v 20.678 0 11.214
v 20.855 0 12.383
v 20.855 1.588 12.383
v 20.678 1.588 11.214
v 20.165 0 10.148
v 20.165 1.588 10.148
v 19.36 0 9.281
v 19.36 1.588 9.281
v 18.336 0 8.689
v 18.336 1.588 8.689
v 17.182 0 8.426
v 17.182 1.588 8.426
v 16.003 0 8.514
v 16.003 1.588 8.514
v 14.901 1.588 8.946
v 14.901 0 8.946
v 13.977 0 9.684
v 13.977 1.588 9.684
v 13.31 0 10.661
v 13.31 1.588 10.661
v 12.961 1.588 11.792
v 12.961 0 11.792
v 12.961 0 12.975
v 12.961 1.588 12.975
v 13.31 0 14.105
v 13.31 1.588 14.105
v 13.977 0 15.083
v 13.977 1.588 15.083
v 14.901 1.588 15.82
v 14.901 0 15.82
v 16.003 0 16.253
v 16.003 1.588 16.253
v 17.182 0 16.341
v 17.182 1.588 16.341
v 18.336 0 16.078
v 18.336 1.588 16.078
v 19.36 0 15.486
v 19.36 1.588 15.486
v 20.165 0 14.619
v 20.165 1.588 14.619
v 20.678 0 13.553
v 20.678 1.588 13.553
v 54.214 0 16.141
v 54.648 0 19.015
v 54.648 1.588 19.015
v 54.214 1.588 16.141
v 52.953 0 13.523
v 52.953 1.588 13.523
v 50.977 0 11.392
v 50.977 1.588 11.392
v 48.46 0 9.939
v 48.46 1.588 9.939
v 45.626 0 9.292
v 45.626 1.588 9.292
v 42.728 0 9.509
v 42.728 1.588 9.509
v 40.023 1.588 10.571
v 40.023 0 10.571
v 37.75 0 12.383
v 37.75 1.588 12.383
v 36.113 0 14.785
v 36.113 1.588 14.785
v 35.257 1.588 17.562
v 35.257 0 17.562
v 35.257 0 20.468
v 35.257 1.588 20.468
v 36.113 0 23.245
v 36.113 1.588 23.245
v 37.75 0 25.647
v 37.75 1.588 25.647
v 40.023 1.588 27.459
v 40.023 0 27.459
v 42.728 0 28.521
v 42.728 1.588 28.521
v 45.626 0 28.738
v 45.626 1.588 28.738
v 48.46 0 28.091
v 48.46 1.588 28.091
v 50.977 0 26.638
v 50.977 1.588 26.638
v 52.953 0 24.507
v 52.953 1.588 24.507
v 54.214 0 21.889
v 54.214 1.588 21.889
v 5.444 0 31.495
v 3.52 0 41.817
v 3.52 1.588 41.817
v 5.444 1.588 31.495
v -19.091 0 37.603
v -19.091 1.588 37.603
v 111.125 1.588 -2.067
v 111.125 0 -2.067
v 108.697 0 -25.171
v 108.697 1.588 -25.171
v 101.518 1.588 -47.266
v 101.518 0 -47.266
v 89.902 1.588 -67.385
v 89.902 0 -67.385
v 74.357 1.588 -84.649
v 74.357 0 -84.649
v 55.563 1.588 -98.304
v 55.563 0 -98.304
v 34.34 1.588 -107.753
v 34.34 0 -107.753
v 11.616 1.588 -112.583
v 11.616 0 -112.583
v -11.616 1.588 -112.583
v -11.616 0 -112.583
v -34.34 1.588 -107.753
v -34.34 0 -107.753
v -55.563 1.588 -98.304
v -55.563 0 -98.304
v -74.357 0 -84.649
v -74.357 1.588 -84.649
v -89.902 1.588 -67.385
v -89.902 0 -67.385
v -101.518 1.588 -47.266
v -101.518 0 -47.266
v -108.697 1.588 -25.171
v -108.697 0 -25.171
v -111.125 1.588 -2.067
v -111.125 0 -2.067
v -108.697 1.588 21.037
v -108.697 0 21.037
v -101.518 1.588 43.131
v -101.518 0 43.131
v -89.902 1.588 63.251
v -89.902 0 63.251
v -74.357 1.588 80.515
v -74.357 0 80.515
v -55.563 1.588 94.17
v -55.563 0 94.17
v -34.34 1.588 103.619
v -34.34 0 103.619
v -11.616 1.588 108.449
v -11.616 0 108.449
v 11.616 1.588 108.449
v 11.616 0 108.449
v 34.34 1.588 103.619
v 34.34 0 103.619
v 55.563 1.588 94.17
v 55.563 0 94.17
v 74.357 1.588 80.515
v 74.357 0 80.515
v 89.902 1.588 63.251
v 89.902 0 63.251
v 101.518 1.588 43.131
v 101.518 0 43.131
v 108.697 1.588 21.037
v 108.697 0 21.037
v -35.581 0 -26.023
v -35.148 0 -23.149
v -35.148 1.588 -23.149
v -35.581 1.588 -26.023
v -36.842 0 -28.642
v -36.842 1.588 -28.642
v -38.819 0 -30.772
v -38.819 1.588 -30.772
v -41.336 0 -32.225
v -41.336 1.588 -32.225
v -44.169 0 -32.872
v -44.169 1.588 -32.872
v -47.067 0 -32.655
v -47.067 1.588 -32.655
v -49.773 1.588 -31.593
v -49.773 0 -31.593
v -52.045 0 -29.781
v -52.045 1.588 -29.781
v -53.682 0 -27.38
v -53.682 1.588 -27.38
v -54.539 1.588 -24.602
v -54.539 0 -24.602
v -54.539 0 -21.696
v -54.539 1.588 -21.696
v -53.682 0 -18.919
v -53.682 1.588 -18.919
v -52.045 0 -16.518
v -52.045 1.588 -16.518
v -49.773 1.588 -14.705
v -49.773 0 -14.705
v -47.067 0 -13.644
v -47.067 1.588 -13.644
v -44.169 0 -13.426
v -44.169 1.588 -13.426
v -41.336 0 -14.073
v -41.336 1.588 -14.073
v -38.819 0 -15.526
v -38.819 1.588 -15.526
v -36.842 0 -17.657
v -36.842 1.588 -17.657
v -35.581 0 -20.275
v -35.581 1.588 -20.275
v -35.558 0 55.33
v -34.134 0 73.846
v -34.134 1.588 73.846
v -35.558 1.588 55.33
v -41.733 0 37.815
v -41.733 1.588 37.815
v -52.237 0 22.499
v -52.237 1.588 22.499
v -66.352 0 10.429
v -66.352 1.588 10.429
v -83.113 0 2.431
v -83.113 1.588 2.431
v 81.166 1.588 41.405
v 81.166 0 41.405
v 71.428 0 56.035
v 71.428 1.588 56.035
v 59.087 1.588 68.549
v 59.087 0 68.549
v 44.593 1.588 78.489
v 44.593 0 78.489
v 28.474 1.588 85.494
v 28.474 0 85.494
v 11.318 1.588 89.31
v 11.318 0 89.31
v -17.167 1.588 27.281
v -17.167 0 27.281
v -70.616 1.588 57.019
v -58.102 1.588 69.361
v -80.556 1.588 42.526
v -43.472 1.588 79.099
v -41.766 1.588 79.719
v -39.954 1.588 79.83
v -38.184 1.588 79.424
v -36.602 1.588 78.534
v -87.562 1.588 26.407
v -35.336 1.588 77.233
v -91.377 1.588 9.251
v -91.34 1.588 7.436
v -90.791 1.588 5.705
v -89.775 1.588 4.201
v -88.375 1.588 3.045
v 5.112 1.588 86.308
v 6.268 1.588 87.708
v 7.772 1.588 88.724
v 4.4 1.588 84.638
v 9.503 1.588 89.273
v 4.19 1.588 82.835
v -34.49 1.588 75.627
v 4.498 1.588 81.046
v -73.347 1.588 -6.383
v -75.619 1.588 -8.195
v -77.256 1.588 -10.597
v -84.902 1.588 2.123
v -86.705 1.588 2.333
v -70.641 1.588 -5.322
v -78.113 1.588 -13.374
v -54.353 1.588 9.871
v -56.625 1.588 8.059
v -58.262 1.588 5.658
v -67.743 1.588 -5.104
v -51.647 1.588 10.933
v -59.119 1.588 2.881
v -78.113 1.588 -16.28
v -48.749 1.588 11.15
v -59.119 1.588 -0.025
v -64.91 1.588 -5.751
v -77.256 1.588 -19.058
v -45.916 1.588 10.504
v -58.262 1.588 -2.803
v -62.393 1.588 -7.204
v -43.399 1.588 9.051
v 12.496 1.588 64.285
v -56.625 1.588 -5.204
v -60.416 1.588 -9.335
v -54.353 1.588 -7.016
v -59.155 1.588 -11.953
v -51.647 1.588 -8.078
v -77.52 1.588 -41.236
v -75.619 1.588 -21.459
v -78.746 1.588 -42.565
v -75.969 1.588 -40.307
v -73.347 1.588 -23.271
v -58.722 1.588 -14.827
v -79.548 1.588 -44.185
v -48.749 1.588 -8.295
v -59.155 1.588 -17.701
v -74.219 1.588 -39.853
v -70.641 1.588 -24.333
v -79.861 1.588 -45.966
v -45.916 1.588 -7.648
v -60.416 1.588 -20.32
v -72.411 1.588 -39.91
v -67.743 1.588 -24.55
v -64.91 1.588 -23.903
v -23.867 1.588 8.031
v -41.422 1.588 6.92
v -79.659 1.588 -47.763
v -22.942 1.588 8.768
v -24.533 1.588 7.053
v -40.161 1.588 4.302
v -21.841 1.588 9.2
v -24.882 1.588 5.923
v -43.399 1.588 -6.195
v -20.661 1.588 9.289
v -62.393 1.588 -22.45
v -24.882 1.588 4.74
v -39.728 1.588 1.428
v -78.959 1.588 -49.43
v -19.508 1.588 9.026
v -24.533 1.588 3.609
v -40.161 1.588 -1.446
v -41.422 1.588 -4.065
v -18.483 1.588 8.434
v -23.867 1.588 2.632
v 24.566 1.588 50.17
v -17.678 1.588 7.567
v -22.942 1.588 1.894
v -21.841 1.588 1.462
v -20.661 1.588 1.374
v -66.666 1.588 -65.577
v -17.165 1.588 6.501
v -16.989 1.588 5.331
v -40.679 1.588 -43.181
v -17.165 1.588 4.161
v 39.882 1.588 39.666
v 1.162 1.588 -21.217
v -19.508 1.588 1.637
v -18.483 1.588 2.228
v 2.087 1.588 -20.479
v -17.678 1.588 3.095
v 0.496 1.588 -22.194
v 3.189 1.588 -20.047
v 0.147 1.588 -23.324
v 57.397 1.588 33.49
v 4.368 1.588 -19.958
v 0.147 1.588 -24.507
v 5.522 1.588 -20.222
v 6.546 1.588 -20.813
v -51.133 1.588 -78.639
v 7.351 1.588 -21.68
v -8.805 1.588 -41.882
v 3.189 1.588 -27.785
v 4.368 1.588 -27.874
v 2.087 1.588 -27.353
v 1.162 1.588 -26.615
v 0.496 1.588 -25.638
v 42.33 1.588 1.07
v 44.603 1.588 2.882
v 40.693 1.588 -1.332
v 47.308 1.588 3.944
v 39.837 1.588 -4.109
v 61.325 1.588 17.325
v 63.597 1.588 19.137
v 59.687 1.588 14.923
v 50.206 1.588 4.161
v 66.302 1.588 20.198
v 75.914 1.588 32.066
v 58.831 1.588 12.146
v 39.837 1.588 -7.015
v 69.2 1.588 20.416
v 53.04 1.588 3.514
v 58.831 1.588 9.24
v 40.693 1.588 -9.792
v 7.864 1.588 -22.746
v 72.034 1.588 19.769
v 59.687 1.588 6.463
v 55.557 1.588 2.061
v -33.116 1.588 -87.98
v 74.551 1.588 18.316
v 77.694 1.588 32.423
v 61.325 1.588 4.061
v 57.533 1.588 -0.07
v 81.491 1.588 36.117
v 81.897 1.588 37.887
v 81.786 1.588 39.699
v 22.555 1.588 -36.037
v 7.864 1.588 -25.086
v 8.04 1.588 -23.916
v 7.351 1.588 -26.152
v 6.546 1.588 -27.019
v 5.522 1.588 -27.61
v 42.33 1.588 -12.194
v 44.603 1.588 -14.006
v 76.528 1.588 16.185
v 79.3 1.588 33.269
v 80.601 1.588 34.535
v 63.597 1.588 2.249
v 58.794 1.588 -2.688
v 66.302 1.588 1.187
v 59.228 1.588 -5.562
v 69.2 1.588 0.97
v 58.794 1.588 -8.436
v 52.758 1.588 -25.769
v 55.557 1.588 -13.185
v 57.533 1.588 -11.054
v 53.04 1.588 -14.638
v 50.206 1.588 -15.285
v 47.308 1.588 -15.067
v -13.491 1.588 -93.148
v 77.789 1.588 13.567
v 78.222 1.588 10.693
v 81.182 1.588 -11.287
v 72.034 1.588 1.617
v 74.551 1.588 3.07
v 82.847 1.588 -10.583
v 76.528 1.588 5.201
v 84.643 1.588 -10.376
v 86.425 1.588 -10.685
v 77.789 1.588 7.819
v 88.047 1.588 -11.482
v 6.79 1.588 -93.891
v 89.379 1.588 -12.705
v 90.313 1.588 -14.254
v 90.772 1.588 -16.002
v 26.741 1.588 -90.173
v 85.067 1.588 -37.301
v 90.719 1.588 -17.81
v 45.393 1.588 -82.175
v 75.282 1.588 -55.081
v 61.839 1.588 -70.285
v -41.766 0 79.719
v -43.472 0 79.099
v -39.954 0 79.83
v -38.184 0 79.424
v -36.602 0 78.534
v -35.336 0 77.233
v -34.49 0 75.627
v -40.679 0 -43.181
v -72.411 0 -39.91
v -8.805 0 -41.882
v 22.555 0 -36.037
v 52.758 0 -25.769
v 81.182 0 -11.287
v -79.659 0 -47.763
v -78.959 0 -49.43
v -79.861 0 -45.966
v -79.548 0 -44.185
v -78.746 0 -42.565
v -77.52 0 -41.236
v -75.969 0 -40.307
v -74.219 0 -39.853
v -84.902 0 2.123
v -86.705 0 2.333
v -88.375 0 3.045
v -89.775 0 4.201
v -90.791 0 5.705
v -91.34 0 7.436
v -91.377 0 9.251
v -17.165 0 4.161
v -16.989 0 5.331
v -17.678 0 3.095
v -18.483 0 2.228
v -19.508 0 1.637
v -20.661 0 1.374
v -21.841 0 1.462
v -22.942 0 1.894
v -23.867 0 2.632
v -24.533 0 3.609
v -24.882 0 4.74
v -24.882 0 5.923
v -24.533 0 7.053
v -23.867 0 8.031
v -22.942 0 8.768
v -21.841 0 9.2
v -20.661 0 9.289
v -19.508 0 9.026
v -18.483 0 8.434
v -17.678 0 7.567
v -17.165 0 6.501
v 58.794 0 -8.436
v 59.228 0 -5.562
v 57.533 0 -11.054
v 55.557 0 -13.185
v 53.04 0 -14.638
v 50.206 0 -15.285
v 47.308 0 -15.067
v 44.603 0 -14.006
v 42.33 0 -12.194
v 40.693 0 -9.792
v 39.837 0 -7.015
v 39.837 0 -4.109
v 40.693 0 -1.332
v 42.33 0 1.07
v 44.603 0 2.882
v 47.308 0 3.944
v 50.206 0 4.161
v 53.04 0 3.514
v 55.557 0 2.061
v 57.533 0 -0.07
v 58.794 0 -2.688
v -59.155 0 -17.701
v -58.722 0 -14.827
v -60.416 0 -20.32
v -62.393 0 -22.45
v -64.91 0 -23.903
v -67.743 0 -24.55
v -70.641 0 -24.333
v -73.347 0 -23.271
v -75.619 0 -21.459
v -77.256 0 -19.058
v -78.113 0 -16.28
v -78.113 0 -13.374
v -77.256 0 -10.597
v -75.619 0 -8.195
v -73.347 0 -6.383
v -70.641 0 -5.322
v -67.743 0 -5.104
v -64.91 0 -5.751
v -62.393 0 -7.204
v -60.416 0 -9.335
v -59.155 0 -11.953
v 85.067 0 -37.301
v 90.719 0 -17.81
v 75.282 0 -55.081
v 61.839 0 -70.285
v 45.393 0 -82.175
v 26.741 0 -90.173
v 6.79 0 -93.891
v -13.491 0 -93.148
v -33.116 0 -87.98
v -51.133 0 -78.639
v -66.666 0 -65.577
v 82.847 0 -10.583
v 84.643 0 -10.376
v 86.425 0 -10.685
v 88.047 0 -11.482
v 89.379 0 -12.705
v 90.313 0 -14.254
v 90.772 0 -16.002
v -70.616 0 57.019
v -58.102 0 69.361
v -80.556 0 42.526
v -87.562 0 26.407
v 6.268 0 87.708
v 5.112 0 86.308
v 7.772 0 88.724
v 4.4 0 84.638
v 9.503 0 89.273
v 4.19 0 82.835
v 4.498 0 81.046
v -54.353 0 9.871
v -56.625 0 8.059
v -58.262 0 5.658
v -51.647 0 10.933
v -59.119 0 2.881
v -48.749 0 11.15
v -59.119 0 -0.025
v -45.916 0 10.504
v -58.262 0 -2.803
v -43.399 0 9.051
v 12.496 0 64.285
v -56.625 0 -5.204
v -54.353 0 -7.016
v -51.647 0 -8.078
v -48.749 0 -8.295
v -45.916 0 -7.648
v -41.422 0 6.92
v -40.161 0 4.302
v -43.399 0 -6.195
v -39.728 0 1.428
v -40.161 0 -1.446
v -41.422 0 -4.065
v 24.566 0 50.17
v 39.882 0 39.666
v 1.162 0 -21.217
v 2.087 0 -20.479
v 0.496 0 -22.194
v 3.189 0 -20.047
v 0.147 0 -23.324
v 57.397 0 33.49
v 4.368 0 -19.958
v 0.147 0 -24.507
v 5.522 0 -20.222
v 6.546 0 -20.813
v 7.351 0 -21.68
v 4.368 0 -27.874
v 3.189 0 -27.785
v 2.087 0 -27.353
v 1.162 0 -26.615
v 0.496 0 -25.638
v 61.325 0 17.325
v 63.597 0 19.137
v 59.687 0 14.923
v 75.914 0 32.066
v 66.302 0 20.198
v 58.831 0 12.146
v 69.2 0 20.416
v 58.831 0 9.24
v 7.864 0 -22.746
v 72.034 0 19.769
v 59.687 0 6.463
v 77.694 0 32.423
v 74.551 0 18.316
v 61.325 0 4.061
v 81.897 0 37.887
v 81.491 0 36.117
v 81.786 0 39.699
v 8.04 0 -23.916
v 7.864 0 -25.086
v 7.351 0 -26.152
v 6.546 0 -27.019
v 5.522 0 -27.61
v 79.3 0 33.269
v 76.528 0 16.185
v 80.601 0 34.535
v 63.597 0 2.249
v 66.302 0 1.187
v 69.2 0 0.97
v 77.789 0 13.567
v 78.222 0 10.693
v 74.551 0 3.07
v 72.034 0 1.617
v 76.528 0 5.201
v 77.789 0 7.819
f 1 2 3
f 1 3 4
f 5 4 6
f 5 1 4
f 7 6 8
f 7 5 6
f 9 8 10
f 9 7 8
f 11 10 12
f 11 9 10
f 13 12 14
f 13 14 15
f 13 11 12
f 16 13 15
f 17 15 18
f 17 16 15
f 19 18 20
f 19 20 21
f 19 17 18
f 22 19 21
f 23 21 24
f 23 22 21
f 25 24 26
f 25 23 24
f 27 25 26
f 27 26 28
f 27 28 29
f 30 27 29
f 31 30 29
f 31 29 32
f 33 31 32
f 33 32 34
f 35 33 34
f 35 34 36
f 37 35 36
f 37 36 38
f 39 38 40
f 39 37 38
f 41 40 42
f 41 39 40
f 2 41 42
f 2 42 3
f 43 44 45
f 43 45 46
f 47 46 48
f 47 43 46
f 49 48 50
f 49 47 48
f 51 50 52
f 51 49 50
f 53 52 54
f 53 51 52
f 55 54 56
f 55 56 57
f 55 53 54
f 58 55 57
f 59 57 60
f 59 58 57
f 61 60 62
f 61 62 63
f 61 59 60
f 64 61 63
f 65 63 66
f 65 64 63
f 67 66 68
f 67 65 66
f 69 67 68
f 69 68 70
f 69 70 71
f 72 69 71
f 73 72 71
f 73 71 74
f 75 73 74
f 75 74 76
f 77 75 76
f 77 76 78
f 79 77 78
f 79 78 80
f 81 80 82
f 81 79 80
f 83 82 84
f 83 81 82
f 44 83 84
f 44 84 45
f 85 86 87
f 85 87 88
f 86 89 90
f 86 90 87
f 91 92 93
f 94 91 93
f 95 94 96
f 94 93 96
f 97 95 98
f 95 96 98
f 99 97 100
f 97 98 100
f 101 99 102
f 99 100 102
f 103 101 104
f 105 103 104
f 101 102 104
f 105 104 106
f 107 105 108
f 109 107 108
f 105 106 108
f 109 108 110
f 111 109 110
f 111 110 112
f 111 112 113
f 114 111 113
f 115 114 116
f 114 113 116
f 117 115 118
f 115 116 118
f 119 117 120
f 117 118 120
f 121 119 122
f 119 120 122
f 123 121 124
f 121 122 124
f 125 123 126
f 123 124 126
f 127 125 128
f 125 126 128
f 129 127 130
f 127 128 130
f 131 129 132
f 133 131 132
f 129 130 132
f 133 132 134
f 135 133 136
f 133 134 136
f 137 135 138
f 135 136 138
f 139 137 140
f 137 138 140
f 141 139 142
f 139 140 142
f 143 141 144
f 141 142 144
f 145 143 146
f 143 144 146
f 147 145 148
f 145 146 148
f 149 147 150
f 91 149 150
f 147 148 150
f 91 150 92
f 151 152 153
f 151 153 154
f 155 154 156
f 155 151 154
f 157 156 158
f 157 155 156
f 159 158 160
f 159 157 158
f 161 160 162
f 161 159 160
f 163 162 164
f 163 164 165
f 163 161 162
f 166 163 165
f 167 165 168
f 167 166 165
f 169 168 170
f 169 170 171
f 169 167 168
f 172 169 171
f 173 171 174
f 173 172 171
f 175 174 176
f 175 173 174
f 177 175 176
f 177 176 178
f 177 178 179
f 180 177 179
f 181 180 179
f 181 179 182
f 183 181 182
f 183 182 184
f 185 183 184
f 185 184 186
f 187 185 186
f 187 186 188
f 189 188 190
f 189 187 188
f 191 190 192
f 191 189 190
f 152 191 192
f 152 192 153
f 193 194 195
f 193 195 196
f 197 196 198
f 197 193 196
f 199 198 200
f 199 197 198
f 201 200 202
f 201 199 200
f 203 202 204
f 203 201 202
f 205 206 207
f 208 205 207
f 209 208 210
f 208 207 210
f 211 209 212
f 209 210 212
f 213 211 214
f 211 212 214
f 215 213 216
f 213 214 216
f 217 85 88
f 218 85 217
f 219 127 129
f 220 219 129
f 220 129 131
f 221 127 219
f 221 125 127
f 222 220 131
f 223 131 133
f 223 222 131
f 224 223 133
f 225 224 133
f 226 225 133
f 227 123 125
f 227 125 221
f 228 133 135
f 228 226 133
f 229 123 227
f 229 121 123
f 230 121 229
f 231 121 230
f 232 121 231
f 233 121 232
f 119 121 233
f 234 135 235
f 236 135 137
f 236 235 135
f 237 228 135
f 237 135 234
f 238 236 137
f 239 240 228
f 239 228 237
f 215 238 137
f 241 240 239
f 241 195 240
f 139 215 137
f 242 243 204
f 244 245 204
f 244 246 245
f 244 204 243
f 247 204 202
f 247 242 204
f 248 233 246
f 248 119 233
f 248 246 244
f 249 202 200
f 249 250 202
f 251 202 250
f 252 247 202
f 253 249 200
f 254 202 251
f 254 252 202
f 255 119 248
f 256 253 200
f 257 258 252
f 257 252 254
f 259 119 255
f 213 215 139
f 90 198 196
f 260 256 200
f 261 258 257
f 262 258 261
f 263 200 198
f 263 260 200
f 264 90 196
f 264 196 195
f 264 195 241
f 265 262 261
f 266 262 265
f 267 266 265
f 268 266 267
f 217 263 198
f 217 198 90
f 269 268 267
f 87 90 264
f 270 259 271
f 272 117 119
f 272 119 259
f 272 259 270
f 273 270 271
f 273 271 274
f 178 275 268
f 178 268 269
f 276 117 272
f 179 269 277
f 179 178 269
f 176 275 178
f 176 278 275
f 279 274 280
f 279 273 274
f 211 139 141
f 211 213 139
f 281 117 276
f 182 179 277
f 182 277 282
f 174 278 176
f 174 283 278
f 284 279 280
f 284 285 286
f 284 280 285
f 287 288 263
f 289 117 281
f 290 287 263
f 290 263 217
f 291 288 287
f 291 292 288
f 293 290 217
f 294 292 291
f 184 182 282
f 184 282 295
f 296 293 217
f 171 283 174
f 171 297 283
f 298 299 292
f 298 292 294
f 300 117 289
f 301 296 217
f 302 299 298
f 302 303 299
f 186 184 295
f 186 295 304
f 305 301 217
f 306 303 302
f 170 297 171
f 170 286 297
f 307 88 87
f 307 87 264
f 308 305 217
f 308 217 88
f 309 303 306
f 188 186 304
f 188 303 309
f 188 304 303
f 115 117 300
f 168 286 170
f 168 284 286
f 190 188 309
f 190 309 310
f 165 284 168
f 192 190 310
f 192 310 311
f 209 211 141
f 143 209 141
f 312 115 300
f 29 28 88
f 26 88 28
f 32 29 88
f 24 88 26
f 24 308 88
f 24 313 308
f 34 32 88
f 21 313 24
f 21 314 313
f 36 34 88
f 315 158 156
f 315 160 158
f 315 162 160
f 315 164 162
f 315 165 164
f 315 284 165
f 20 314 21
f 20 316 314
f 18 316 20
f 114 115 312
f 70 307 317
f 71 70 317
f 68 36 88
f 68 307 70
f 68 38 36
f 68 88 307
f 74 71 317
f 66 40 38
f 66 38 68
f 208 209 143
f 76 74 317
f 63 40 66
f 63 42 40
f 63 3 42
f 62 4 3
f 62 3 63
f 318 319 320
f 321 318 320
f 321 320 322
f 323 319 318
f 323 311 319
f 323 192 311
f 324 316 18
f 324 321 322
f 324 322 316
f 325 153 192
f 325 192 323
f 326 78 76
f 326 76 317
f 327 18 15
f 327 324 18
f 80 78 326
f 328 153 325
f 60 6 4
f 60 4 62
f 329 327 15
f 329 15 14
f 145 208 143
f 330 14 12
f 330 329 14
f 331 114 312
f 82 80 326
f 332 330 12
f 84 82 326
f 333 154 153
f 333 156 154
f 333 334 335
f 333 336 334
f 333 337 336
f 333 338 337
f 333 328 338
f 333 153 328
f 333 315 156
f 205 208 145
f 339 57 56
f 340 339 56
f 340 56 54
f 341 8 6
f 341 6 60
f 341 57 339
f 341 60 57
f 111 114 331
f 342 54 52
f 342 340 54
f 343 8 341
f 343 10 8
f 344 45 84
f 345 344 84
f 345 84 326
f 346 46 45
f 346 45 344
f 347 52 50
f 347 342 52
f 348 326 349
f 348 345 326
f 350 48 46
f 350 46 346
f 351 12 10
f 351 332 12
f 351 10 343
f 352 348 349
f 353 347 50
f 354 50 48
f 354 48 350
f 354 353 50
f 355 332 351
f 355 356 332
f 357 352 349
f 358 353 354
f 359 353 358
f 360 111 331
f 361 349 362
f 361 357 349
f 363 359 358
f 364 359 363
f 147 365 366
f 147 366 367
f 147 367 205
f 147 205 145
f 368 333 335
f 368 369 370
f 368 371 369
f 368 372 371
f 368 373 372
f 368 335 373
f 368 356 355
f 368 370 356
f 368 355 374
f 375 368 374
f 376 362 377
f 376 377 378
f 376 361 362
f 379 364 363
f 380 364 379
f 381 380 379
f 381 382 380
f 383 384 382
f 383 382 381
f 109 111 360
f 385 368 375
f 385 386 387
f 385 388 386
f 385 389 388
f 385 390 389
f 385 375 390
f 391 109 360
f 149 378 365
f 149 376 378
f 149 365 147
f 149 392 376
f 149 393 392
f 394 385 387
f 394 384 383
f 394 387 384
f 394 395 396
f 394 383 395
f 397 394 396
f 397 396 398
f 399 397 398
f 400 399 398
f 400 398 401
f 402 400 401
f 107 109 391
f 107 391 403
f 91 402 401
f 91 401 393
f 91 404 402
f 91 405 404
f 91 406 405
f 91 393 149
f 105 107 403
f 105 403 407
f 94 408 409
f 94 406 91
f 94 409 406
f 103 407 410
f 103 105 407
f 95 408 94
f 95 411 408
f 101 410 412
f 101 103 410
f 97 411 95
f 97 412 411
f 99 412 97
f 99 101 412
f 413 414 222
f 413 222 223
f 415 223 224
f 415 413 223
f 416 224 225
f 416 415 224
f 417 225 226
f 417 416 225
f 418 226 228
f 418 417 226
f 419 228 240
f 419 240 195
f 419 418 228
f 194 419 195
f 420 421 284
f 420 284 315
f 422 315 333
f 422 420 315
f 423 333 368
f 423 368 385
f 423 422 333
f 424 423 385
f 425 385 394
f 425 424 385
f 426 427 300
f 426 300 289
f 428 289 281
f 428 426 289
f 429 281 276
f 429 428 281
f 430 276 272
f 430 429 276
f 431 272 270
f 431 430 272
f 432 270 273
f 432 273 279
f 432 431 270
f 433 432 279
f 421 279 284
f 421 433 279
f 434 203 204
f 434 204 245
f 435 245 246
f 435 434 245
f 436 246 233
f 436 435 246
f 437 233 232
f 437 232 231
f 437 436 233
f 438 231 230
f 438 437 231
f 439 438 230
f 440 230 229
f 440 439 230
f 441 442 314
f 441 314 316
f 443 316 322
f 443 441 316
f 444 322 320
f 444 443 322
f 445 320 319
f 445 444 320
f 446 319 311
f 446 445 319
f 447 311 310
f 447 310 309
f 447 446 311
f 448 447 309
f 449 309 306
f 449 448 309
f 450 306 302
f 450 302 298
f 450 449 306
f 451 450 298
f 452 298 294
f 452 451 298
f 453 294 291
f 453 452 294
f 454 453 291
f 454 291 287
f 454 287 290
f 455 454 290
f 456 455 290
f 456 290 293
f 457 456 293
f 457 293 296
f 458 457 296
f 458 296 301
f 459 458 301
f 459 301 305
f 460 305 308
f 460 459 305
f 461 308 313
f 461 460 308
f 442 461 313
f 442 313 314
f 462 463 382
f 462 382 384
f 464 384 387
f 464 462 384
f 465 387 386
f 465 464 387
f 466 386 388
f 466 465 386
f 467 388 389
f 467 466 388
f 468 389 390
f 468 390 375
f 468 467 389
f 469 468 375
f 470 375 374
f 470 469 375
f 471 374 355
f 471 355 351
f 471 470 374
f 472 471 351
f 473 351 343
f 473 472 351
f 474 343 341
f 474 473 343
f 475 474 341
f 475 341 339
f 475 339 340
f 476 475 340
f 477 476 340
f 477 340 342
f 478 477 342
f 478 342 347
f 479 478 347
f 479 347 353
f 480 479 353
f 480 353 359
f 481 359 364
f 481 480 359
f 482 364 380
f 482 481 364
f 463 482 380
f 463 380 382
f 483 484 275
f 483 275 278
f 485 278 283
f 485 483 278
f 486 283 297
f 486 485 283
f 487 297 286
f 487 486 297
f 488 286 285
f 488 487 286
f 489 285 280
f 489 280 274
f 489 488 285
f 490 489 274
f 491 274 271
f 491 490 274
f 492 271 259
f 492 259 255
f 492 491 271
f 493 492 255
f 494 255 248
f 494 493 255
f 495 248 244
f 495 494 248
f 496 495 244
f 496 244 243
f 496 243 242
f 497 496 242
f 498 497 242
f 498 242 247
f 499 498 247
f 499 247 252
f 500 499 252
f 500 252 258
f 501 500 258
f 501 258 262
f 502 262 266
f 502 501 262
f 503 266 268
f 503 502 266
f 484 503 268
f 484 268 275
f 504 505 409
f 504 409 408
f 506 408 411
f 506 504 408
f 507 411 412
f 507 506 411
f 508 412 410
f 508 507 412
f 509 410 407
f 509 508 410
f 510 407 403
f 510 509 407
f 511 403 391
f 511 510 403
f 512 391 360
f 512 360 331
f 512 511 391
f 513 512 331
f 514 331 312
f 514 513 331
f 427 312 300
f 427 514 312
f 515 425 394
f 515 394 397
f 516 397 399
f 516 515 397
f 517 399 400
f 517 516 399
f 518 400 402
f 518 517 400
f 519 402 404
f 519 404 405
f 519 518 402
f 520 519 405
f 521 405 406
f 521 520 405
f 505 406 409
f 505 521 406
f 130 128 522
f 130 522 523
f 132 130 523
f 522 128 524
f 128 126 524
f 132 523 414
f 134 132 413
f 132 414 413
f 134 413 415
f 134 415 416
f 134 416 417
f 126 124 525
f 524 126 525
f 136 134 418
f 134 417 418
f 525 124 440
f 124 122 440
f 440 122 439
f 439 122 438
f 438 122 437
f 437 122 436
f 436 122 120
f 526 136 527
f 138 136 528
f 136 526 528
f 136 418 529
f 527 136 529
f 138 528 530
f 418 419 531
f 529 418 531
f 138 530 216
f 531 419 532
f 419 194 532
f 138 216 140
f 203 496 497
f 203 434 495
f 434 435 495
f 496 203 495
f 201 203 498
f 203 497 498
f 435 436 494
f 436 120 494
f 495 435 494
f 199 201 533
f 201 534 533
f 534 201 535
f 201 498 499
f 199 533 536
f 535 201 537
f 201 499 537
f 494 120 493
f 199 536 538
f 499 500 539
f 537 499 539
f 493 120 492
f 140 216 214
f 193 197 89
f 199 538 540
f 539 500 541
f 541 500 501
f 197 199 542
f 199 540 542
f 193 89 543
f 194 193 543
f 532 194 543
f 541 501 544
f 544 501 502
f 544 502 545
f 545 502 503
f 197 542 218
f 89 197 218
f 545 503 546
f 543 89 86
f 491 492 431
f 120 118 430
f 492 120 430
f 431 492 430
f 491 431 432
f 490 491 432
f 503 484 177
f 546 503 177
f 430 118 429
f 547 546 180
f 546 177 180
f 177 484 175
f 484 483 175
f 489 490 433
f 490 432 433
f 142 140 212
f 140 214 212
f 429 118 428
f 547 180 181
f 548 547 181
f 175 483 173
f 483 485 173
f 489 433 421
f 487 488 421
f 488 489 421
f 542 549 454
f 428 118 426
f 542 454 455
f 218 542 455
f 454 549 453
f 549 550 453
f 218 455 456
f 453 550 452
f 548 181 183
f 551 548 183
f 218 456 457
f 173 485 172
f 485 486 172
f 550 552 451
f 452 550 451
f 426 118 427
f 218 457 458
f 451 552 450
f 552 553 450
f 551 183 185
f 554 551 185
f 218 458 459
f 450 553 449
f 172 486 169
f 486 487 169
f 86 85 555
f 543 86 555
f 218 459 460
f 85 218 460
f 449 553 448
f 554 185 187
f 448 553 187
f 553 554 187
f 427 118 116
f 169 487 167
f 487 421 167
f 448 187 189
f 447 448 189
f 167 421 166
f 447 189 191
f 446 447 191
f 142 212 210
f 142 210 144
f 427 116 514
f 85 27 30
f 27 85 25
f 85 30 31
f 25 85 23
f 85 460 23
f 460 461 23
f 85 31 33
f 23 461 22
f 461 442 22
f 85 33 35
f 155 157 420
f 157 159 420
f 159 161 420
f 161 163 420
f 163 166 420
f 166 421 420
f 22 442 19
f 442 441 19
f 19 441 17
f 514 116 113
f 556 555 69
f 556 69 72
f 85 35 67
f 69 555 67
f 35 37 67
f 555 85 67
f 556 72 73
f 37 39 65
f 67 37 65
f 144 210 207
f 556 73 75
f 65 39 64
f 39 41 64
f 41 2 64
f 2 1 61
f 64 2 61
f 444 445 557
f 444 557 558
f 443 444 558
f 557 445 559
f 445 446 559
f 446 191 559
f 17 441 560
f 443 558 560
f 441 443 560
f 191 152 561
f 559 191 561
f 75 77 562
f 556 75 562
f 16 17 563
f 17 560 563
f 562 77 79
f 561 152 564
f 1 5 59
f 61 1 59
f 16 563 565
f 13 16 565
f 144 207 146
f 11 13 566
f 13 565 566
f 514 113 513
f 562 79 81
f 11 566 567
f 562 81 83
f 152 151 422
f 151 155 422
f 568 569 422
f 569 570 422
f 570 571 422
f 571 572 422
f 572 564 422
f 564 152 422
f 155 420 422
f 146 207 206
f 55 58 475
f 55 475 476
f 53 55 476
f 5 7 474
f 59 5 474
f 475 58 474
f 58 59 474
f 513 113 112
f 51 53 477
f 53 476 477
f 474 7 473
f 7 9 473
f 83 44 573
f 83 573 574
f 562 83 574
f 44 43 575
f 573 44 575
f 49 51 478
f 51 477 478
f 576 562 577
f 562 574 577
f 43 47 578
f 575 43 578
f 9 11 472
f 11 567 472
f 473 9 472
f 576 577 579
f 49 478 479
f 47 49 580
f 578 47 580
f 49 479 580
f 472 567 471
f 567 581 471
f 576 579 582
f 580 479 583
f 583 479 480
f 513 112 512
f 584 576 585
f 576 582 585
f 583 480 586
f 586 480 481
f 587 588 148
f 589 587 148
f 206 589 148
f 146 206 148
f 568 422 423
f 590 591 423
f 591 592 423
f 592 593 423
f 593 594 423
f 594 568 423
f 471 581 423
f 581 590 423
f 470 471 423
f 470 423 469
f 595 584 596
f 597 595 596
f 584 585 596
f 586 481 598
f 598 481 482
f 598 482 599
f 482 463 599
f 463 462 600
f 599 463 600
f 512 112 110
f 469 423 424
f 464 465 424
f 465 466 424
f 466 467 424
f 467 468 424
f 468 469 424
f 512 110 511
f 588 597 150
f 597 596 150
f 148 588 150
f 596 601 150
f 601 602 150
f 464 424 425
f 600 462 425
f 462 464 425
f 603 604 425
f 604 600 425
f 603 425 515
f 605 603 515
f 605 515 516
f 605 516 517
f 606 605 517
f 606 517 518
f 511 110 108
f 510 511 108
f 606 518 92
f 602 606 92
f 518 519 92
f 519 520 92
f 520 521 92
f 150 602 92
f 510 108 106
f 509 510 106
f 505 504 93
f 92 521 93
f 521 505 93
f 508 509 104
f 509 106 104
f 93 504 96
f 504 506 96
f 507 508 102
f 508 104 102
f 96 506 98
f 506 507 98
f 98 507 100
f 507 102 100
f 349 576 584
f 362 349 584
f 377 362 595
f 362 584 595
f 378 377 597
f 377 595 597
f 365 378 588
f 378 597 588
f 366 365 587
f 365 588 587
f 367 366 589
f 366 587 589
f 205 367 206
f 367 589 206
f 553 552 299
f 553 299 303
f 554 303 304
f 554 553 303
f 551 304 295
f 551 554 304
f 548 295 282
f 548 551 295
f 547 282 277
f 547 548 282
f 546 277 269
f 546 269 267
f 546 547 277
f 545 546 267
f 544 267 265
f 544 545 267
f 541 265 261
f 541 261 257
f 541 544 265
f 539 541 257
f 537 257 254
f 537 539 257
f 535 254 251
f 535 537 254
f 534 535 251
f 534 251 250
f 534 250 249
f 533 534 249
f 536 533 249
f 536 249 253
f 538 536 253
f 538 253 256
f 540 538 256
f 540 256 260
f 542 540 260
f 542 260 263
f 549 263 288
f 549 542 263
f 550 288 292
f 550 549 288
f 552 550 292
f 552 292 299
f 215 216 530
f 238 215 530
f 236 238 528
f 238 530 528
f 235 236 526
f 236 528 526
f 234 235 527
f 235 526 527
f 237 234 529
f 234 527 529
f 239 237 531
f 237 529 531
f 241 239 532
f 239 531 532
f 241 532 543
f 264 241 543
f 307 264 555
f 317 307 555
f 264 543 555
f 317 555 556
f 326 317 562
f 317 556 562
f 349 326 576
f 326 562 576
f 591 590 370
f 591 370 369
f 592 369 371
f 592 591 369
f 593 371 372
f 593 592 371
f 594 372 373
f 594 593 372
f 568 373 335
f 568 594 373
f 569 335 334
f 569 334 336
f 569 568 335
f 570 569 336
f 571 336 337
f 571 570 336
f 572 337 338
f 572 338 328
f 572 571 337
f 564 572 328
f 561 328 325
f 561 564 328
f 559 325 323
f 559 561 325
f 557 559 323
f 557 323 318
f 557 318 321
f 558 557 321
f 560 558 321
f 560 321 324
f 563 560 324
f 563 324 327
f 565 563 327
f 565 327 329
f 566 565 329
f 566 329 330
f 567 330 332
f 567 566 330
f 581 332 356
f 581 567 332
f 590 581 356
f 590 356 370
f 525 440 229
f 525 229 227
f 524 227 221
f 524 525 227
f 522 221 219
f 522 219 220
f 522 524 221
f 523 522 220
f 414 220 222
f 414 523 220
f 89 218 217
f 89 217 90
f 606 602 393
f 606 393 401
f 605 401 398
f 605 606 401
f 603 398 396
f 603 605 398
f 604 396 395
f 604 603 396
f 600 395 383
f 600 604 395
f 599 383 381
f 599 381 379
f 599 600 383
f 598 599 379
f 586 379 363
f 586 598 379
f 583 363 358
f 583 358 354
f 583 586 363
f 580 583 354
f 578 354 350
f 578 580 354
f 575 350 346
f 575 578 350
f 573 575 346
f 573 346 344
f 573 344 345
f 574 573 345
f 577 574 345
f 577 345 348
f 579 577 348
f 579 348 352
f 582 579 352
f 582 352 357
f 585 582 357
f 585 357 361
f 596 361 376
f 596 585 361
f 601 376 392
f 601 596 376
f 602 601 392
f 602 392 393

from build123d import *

# Parameters (mm, degrees)
SKETCH1_R           = 111.125
SKETCH1_R_2         = 3.96875
SKETCH1_R_3         = 9.75
BOSS_EXTRUDE1_DEPTH = 1.5875


with BuildPart() as part:
    # Sketch1 → Boss-Extrude1 (new body)
    with BuildSketch(Plane(origin=(0, 0, 0), x_dir=(1, 0, 0), z_dir=(0, 1, 0))):
        with Locations((0, 2.067110037)):
            Circle(SKETCH1_R)
        with Locations((4.071636725, 23.915963539)):
            Circle(SKETCH1_R_2, mode=Mode.SUBTRACT)
        with Locations((-20.957480539, -5.331175876)):
            Circle(SKETCH1_R_2, mode=Mode.SUBTRACT)
        with Locations((16.885843815, -12.383457553)):
            Circle(SKETCH1_R_2, mode=Mode.SUBTRACT)
        with Locations((-44.897615706, 23.149190197)):
            Circle(SKETCH1_R_3, mode=Mode.SUBTRACT)
        with Locations((-49.477634519, -1.427697882)):
            Circle(SKETCH1_R_3, mode=Mode.SUBTRACT)
        with Locations((-68.471834536, 14.827158799)):
            Circle(SKETCH1_R_3, mode=Mode.SUBTRACT)
        with Locations((68.471834536, -10.692938726)):
            Circle(SKETCH1_R_3, mode=Mode.SUBTRACT)
        with Locations((44.897615706, -19.014970124)):
            Circle(SKETCH1_R_3, mode=Mode.SUBTRACT)
        with Locations((49.477634519, 5.561917956)):
            Circle(SKETCH1_R_3, mode=Mode.SUBTRACT)
        Polygon((3.519990025, -41.816901652), (5.443597926, -31.494608658), (-17.167139107, -27.28099135), (-19.090747008, -37.603284344), align=None, mode=Mode.SUBTRACT)
        with BuildLine():
            ThreePointArc((90.719240331, 17.809570412), (16.868209288, 92.583788834), (-78.959268715, 49.429959498))
            ThreePointArc((-78.959268715, 49.429959498), (-78.745756198, 42.56506275), (-72.411496849, 39.909963234))
            ThreePointArc((-72.411496849, 39.909963234), (6.979948671, 39.52228747), (81.18188186, 11.287113924))
            ThreePointArc((81.18188186, 11.287113924), (88.04732163, 11.482387358), (90.719240331, 17.809570412))
        make_face(mode=Mode.SUBTRACT)
        with BuildLine():
            ThreePointArc((-34.133508794, -73.846482708), (-46.481955973, -29.811909239), (-83.112792301, -2.431083134))
            ThreePointArc((-83.112792301, -2.431083134), (-89.116651342, -3.572720267), (-91.376738817, -9.250894562))
            ThreePointArc((-91.376738817, -9.250894562), (-75.932582562, -50.010222177), (-43.472216603, -79.099213082))
            ThreePointArc((-43.472216603, -79.099213082), (-37.361105633, -79.036114425), (-34.133508794, -73.846482708))
        make_face(mode=Mode.SUBTRACT)
        with BuildLine():
            ThreePointArc((4.498193171, -81.045682265), (31.879019276, -44.414845936), (75.913592744, -32.066398757))
            ThreePointArc((75.913592744, -32.066398757), (81.103224462, -35.293995597), (81.166323119, -41.405106566))
            ThreePointArc((81.166323119, -41.405106566), (52.077332214, -73.865472525), (11.318004599, -89.309628781))
            ThreePointArc((11.318004599, -89.309628781), (5.639830304, -87.049541305), (4.498193171, -81.045682265))
        make_face(mode=Mode.SUBTRACT)
    extrude(amount=BOSS_EXTRUDE1_DEPTH)


solid = part.part
